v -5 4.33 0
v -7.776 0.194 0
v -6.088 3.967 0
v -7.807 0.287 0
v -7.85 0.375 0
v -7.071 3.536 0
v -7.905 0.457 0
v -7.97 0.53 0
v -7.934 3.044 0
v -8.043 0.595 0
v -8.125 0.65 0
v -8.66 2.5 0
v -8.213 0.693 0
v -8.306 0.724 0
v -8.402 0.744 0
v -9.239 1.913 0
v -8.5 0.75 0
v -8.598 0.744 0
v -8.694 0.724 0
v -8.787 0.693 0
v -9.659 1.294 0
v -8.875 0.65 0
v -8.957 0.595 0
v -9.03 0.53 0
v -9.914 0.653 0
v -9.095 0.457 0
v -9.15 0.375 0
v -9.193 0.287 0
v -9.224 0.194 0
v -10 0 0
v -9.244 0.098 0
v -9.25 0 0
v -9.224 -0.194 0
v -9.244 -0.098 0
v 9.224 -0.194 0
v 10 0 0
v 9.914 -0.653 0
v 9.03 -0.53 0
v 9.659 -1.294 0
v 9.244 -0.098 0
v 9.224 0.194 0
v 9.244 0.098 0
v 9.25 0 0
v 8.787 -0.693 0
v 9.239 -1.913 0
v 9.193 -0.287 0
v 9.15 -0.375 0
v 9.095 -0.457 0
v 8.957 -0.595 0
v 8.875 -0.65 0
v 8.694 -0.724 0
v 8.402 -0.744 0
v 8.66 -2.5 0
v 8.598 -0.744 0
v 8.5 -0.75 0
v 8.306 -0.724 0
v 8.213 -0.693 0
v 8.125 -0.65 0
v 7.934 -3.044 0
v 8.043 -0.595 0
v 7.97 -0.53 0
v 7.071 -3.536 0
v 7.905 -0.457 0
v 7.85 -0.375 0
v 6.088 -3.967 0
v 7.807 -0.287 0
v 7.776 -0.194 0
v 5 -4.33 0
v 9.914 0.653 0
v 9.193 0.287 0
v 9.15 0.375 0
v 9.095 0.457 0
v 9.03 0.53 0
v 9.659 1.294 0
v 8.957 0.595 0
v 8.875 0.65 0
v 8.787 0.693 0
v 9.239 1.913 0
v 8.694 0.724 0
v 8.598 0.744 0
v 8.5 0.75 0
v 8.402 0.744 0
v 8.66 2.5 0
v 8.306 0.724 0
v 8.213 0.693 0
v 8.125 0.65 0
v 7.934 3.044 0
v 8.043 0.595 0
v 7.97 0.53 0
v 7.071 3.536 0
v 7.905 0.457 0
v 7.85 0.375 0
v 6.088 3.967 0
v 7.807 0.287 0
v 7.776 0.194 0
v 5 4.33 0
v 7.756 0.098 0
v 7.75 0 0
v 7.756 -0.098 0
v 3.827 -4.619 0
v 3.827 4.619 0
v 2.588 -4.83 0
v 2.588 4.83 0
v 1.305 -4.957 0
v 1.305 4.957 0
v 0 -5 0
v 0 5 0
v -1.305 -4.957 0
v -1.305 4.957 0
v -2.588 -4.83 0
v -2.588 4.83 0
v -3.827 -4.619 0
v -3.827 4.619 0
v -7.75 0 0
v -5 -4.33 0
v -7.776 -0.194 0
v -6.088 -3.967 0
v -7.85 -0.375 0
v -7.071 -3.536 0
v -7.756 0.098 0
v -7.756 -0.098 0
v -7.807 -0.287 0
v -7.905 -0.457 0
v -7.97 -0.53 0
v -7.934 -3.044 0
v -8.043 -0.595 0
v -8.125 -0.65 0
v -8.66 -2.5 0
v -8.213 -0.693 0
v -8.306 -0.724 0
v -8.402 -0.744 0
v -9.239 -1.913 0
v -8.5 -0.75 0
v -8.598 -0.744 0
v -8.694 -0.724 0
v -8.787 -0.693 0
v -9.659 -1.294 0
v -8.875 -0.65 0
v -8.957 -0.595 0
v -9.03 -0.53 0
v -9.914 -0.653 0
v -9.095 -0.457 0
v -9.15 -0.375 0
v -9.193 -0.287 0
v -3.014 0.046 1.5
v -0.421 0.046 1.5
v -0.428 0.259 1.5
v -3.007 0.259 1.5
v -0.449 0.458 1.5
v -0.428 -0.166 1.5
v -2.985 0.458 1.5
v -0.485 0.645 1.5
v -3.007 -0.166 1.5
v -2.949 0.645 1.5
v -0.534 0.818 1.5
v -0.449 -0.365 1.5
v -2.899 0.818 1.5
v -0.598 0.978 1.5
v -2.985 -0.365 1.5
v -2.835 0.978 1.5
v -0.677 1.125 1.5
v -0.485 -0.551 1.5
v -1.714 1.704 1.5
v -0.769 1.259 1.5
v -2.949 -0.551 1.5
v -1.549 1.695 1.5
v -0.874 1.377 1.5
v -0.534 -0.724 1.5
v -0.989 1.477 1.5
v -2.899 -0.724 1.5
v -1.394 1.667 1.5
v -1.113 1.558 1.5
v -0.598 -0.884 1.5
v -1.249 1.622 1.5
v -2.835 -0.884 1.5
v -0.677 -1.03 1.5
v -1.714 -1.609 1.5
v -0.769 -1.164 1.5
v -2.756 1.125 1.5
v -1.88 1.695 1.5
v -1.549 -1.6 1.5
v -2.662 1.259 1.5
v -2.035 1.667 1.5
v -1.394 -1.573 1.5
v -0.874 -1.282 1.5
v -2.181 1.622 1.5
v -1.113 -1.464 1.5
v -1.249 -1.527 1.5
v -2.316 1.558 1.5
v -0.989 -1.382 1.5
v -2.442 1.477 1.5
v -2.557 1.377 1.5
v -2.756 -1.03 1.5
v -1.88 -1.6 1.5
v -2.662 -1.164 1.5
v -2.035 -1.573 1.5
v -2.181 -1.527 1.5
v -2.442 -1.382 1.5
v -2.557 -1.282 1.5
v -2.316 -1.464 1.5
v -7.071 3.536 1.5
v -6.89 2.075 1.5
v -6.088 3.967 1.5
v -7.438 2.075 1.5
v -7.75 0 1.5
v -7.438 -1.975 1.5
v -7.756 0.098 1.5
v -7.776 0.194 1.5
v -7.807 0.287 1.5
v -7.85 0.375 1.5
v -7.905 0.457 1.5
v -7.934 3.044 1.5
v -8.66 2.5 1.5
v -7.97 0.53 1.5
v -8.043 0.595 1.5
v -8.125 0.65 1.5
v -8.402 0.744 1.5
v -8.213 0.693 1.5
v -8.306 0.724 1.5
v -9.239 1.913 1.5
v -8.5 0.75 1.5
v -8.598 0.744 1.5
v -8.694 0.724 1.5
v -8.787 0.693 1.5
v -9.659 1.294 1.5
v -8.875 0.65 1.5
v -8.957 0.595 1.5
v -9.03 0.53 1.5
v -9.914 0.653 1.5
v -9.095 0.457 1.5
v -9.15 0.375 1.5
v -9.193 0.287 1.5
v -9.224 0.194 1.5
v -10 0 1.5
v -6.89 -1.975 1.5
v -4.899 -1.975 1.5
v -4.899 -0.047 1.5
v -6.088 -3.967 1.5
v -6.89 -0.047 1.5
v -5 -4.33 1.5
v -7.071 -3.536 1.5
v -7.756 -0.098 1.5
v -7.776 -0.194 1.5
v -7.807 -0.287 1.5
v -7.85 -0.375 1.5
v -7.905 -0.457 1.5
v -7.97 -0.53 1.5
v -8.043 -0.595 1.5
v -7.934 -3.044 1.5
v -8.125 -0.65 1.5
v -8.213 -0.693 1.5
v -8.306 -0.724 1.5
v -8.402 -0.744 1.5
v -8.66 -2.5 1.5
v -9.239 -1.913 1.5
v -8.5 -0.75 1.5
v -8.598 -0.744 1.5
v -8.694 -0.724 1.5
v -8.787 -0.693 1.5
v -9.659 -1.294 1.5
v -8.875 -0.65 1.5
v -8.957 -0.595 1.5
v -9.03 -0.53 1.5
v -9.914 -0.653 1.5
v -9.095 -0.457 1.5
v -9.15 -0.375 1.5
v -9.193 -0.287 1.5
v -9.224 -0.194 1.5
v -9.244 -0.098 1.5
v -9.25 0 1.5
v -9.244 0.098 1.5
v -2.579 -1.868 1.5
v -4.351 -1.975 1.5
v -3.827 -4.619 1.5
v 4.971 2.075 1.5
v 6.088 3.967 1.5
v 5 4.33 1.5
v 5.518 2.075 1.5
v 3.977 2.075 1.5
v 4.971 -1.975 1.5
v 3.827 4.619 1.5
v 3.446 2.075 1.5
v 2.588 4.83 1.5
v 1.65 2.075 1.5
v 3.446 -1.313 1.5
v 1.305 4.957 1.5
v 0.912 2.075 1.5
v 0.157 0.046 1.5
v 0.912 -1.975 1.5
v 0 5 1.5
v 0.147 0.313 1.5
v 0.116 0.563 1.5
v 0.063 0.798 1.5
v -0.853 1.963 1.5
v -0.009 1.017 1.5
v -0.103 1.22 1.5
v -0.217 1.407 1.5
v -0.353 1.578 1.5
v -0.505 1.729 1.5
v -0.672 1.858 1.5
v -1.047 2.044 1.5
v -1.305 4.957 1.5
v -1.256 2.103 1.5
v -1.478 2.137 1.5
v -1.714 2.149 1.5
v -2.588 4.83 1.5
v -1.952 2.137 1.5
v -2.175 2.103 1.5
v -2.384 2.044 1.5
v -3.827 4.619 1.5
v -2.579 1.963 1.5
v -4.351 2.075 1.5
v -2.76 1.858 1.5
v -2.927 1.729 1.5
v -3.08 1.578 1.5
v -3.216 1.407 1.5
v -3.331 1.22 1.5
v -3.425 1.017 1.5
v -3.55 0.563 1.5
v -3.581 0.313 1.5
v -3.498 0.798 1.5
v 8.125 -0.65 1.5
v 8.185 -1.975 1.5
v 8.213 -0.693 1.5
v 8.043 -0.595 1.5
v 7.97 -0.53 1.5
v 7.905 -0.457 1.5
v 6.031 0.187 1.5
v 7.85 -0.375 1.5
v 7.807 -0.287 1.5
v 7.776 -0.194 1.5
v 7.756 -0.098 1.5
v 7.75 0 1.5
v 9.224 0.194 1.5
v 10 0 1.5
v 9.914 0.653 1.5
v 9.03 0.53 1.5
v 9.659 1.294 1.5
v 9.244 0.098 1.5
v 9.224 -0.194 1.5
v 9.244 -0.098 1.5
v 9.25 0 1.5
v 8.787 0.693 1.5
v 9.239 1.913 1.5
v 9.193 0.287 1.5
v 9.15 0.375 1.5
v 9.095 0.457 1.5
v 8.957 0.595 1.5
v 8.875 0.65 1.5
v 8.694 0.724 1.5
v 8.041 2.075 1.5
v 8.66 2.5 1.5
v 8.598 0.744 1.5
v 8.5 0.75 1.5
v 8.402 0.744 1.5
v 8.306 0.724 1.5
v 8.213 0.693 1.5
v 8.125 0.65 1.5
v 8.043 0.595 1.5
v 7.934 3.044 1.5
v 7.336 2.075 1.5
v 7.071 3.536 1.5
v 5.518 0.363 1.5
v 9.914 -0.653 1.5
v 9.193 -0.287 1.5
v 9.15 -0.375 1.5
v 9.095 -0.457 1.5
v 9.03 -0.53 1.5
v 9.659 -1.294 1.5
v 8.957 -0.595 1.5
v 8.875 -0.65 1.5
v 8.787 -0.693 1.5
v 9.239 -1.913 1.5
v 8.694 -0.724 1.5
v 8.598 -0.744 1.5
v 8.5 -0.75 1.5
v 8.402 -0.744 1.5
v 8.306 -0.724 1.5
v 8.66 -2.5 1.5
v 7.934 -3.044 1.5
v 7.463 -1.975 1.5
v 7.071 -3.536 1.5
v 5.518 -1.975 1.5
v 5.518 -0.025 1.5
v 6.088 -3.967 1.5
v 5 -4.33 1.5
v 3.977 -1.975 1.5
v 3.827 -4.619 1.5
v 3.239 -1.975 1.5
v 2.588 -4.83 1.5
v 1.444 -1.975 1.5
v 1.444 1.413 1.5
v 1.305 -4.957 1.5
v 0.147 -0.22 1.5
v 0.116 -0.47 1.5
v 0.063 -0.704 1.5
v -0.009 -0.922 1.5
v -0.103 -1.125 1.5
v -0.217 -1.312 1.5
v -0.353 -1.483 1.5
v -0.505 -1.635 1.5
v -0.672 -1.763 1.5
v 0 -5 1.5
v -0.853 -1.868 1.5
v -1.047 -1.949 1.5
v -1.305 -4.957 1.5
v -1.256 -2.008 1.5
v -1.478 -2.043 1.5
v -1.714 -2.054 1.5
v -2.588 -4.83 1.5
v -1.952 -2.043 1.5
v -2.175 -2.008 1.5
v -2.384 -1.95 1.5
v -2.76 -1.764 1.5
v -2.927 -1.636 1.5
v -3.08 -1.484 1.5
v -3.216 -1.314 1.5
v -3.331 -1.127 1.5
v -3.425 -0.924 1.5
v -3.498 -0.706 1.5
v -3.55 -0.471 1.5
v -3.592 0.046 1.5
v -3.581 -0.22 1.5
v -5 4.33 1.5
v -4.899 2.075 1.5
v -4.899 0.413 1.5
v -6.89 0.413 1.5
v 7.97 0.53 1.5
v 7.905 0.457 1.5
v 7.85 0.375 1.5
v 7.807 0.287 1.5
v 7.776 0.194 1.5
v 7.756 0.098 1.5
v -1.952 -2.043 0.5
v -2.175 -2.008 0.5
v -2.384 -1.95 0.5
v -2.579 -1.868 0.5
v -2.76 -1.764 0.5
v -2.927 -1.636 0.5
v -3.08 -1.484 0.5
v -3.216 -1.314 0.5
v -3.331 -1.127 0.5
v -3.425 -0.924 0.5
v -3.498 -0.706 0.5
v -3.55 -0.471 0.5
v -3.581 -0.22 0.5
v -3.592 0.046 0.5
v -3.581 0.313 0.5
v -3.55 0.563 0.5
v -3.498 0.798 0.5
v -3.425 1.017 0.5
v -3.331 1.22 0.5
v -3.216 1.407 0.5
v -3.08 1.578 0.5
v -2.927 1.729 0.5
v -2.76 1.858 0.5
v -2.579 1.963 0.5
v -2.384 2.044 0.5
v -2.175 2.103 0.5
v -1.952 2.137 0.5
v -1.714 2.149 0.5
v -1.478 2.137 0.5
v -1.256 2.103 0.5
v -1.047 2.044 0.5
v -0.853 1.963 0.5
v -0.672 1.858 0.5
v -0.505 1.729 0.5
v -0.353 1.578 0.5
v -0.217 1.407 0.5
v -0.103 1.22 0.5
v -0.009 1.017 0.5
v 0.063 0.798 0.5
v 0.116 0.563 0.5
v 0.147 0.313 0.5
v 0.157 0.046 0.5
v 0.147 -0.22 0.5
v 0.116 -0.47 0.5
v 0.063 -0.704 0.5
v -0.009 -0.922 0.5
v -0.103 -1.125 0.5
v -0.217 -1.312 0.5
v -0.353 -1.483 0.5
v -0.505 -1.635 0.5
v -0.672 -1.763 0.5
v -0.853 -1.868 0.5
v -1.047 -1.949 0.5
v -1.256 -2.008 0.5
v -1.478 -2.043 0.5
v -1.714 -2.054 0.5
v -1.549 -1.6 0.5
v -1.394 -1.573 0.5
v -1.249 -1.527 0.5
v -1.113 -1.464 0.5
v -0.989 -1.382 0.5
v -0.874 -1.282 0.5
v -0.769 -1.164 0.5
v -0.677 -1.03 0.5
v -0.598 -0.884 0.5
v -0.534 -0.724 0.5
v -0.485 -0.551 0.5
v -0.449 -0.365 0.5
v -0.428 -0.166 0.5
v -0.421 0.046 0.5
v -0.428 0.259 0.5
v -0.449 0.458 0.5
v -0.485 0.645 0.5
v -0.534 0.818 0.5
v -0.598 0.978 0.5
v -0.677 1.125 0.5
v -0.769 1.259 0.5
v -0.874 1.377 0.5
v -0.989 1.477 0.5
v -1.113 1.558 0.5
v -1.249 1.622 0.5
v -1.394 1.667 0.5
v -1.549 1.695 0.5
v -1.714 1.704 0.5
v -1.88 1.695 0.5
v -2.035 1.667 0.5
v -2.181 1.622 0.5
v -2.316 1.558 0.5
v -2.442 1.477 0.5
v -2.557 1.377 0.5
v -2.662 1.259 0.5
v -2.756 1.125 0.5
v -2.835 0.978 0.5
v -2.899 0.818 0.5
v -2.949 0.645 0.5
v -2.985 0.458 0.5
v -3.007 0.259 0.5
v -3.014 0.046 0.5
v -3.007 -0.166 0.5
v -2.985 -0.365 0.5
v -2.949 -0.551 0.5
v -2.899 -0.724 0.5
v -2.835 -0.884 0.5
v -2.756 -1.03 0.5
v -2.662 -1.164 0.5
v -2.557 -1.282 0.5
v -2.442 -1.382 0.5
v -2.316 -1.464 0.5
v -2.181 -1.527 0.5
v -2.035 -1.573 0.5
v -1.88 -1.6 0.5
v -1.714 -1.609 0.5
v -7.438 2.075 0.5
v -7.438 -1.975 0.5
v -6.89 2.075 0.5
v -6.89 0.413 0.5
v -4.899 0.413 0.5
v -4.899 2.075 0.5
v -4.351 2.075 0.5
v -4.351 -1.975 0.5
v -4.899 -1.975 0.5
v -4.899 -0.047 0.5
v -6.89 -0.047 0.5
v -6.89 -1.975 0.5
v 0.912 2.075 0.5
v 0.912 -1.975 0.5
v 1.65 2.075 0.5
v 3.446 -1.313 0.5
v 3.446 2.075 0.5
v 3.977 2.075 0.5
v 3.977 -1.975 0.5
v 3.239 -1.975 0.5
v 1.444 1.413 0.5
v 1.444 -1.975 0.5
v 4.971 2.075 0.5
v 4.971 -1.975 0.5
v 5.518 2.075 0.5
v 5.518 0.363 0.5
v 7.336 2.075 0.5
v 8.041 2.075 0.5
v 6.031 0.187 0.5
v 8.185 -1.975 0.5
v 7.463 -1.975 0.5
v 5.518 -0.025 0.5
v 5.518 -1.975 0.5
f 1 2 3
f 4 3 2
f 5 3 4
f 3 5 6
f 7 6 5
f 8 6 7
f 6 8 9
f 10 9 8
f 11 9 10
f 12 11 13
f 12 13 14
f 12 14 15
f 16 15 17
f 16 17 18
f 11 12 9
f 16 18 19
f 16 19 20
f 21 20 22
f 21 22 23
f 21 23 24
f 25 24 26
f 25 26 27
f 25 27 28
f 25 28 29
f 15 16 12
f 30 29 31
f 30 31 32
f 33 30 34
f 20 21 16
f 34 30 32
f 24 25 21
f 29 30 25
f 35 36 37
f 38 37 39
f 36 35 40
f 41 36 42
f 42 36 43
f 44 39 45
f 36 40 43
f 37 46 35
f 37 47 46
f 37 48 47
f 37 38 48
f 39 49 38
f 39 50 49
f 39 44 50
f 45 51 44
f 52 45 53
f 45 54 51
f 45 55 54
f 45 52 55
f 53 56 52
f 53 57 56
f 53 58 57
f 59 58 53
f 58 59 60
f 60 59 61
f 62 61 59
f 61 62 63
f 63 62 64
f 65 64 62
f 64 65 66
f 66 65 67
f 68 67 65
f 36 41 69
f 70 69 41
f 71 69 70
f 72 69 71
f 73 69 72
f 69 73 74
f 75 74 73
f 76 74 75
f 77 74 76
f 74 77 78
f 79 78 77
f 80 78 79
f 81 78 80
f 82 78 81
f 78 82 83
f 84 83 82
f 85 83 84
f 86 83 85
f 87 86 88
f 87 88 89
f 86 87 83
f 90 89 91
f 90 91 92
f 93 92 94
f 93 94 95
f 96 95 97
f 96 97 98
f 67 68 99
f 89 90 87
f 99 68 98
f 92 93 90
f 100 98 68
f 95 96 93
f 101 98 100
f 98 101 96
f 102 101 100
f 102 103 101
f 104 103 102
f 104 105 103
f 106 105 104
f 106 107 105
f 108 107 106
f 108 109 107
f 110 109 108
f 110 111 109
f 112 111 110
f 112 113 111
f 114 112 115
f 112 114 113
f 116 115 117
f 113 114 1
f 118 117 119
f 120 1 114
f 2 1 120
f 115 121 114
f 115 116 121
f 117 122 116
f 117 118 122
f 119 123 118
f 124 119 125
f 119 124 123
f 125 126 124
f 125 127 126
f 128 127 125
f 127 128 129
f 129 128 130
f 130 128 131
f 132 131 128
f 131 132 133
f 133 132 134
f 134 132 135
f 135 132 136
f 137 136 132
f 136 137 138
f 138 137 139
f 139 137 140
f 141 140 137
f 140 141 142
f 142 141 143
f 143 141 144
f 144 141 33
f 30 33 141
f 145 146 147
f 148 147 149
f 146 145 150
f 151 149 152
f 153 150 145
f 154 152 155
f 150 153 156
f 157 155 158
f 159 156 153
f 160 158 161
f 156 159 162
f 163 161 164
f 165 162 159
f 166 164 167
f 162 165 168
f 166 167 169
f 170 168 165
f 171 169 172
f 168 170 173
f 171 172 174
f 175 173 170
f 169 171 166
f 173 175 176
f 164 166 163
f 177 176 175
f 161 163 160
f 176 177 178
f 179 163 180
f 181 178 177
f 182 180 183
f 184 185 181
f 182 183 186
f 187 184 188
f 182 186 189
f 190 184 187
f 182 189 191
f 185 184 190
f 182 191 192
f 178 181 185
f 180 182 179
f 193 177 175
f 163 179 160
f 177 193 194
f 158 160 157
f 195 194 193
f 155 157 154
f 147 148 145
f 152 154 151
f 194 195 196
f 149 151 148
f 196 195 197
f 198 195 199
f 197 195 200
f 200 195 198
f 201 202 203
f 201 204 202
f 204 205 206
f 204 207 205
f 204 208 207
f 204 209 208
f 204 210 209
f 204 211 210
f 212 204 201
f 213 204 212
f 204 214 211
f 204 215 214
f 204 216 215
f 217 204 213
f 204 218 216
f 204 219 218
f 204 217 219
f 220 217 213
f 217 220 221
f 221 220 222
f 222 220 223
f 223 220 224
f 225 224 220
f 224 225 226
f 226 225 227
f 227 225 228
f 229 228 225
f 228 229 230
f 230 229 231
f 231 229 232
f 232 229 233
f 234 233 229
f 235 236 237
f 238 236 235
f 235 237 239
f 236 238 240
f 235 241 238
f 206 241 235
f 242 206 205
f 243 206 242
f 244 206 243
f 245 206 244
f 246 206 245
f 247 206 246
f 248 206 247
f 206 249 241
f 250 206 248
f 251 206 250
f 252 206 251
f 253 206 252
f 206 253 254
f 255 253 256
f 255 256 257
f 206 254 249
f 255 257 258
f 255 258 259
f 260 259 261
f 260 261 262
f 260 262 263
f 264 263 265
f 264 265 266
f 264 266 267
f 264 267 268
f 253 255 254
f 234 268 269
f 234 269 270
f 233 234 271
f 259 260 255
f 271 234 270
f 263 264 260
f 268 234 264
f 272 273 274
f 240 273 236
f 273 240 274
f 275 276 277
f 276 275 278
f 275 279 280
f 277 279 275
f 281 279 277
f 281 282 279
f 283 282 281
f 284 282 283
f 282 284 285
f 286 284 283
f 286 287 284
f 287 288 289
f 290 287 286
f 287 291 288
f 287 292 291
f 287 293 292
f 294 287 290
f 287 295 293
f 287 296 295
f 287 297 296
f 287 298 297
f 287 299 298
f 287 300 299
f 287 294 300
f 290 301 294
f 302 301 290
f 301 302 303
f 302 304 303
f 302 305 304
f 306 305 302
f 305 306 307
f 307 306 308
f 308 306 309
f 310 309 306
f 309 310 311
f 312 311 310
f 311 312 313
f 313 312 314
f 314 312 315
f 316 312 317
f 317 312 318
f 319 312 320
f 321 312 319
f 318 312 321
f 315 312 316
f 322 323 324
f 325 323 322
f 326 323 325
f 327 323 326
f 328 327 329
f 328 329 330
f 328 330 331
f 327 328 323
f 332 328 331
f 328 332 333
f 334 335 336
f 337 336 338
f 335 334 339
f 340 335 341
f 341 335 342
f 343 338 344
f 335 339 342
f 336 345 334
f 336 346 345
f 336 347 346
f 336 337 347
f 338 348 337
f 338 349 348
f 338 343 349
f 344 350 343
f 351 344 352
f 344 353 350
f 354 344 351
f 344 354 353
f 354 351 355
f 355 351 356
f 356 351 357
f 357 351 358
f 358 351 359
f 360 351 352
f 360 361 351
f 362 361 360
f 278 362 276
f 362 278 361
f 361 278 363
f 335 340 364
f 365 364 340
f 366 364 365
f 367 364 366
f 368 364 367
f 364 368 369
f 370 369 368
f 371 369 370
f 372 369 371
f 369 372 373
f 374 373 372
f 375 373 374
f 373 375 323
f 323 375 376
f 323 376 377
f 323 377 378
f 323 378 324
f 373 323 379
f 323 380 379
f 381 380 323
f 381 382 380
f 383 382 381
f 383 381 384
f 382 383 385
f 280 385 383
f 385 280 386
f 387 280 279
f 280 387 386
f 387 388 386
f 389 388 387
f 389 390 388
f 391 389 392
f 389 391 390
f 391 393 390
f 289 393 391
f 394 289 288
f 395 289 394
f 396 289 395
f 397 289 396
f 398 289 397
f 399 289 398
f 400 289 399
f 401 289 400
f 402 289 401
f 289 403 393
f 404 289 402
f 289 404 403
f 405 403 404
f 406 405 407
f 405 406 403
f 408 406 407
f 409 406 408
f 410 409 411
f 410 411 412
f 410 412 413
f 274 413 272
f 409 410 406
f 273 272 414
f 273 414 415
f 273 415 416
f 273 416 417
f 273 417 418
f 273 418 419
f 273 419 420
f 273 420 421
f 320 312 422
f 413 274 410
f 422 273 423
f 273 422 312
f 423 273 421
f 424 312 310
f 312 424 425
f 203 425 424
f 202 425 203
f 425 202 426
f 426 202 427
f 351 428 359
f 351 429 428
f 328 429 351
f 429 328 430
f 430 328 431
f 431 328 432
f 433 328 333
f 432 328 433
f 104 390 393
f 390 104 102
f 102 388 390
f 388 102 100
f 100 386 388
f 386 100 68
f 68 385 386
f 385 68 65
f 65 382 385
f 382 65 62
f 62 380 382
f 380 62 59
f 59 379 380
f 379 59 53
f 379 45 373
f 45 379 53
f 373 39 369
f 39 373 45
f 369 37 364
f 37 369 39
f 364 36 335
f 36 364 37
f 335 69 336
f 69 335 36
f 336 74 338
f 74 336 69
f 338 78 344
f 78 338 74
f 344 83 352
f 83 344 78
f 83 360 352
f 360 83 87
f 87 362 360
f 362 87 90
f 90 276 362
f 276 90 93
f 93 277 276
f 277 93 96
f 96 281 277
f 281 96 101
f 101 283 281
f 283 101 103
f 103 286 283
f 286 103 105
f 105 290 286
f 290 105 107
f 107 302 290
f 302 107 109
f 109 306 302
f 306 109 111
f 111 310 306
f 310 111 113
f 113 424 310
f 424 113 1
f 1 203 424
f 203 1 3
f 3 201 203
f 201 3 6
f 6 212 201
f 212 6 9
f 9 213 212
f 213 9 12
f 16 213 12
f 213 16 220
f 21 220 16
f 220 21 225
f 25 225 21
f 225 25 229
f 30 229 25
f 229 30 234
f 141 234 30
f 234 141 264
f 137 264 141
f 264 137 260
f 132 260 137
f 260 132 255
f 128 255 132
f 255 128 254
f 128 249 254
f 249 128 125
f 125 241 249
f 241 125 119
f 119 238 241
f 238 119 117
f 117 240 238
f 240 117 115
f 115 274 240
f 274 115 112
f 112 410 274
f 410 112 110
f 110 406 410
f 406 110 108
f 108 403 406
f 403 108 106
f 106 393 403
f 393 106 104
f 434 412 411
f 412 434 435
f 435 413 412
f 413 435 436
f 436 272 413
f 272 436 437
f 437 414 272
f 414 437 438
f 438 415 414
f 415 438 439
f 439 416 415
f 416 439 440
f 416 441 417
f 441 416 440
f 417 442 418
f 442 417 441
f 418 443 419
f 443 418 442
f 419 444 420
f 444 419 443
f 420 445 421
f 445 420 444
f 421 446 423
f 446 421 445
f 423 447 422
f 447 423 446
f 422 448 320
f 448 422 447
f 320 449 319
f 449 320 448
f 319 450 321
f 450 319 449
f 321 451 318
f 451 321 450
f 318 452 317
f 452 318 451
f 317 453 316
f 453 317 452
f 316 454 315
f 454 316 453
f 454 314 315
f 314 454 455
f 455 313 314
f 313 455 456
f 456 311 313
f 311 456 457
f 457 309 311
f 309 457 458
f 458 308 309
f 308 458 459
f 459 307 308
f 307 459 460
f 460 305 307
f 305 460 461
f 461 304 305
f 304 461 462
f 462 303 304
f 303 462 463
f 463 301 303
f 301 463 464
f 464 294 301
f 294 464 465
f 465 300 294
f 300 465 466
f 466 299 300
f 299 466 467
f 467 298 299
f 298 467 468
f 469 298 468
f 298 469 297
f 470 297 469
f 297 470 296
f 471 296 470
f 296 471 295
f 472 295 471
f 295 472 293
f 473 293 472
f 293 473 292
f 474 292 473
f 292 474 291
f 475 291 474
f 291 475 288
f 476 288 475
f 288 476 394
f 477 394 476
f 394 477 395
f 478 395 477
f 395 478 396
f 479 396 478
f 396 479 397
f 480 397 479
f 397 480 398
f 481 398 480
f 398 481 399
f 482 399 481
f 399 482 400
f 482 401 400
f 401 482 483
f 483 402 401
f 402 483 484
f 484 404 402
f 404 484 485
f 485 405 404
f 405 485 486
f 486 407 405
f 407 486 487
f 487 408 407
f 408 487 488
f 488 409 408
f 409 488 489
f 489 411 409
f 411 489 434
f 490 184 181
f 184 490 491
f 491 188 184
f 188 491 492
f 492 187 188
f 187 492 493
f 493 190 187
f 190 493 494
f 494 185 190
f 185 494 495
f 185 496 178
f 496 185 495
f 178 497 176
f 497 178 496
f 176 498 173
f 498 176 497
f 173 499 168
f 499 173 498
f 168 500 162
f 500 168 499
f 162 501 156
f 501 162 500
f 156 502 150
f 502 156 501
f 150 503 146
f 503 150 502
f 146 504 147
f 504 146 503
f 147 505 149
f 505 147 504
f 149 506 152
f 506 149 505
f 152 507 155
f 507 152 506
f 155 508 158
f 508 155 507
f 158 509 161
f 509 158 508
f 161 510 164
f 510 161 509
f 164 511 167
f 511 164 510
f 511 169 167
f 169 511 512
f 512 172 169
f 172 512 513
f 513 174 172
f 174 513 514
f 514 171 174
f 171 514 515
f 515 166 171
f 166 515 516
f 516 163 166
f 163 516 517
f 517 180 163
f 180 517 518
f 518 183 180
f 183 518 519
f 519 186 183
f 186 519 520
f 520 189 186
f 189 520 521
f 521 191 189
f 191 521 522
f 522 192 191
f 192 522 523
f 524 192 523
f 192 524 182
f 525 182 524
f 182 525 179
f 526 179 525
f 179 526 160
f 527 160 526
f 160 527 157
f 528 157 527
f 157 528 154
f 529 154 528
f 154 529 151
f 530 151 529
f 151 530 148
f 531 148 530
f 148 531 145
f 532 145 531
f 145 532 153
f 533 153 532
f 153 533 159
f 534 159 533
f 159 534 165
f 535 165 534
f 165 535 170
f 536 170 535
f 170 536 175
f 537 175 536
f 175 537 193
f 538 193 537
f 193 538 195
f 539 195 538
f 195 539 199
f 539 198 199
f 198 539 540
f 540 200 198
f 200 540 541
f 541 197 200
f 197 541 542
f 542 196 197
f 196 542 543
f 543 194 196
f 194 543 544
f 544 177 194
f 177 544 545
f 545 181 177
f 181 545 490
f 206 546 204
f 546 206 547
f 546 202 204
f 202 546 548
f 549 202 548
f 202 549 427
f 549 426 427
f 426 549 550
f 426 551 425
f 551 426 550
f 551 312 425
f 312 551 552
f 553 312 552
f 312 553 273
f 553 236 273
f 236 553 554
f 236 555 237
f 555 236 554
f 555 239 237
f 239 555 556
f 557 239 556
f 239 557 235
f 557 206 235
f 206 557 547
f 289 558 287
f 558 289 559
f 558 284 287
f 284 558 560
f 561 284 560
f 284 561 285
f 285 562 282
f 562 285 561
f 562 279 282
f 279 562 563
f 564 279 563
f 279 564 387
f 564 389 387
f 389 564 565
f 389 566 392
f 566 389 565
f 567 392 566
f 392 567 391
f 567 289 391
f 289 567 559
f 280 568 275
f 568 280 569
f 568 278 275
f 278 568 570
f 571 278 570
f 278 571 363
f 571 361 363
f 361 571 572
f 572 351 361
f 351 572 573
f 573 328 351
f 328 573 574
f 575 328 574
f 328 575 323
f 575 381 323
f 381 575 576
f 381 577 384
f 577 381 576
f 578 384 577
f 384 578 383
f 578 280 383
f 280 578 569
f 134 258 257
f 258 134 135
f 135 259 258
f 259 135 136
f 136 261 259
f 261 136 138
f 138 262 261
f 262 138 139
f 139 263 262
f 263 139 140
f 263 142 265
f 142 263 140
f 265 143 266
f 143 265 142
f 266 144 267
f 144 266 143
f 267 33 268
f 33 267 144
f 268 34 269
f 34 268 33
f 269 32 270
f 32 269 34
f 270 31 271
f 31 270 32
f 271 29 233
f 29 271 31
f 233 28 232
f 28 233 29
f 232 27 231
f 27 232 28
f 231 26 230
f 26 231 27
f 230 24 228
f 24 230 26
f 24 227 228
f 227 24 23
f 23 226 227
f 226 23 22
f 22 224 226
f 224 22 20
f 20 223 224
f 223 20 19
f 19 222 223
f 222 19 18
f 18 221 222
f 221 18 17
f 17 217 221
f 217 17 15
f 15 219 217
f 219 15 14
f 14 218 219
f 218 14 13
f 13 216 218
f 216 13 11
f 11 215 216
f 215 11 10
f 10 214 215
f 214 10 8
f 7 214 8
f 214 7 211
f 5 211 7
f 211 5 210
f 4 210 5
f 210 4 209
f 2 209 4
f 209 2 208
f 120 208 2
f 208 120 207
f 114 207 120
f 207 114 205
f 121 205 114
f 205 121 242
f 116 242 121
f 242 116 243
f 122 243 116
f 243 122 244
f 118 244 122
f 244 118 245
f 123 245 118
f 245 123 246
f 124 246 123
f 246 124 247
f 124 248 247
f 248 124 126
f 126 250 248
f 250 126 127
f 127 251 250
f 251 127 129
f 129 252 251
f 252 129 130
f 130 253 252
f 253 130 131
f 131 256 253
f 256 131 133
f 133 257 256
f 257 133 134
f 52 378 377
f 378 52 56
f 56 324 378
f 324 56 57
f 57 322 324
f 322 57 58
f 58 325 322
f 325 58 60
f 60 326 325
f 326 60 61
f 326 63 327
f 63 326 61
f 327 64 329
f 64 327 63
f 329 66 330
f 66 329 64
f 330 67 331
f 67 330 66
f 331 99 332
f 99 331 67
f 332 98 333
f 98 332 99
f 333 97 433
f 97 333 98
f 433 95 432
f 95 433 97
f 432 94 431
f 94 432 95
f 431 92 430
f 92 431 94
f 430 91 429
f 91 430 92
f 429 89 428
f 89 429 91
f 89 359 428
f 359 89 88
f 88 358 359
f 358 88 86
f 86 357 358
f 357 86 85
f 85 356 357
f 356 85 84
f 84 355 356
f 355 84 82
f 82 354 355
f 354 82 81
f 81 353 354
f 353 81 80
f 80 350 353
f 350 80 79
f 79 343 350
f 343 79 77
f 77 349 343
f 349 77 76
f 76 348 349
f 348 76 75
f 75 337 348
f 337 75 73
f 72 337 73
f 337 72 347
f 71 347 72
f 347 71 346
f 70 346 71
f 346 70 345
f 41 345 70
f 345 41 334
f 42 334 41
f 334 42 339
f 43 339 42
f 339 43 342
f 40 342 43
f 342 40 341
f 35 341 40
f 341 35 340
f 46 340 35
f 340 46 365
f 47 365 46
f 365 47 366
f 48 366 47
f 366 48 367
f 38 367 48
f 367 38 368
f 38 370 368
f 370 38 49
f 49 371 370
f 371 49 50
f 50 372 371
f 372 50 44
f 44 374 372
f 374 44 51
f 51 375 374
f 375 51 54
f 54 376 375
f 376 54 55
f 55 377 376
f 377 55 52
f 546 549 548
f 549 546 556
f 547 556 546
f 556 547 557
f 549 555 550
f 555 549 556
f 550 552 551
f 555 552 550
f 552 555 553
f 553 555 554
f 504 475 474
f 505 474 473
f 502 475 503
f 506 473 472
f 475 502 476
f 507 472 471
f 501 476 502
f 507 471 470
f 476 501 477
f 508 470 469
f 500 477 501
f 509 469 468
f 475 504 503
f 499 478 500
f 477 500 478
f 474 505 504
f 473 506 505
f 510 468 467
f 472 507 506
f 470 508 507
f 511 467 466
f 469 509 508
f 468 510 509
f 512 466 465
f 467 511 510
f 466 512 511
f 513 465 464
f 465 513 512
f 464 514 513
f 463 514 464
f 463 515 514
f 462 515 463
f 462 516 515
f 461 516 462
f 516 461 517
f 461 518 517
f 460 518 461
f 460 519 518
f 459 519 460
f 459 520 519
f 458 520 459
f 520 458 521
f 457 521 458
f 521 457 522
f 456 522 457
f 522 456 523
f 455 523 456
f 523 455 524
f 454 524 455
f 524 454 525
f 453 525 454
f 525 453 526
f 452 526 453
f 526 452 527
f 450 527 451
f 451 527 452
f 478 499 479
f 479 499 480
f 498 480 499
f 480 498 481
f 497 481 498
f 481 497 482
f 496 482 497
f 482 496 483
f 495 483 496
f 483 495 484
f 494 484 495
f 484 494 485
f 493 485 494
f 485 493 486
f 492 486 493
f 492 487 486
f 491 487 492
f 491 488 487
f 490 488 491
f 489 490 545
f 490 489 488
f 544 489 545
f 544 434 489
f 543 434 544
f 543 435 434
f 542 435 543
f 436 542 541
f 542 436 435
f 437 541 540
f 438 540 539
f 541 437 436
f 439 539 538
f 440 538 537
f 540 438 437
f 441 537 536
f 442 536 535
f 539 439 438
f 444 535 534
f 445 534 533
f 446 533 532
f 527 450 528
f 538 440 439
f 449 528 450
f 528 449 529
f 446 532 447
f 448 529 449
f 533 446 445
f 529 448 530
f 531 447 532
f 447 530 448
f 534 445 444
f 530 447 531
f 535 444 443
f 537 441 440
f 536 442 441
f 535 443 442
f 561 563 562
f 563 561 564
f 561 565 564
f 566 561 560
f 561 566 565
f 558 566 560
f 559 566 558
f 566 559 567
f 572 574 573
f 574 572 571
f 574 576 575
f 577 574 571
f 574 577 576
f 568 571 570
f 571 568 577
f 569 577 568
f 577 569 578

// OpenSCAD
// Make a little badge that says honk.

module holed_ellipse(width, height) {
    difference() {
        scale([1, height/width,0]) circle(r=width/2);
        hole(-8.5, 0.75);
        hole(8.5, 0.75);
    }
}

module hole(x, r) {
    translate([x,0,0]) circle(r);
}

$fn = 48;

top=1.5;
bottom=0.5;

linear_extrude(top) {
    difference() {
        holed_ellipse(20,10);
        #text("HONK", 4, halign="center", valign="center", font="American Typewriter:style=Regular");
    }
}

linear_extrude(bottom) {
    translate([0,0,-bottom]) holed_ellipse(20,10);
}
